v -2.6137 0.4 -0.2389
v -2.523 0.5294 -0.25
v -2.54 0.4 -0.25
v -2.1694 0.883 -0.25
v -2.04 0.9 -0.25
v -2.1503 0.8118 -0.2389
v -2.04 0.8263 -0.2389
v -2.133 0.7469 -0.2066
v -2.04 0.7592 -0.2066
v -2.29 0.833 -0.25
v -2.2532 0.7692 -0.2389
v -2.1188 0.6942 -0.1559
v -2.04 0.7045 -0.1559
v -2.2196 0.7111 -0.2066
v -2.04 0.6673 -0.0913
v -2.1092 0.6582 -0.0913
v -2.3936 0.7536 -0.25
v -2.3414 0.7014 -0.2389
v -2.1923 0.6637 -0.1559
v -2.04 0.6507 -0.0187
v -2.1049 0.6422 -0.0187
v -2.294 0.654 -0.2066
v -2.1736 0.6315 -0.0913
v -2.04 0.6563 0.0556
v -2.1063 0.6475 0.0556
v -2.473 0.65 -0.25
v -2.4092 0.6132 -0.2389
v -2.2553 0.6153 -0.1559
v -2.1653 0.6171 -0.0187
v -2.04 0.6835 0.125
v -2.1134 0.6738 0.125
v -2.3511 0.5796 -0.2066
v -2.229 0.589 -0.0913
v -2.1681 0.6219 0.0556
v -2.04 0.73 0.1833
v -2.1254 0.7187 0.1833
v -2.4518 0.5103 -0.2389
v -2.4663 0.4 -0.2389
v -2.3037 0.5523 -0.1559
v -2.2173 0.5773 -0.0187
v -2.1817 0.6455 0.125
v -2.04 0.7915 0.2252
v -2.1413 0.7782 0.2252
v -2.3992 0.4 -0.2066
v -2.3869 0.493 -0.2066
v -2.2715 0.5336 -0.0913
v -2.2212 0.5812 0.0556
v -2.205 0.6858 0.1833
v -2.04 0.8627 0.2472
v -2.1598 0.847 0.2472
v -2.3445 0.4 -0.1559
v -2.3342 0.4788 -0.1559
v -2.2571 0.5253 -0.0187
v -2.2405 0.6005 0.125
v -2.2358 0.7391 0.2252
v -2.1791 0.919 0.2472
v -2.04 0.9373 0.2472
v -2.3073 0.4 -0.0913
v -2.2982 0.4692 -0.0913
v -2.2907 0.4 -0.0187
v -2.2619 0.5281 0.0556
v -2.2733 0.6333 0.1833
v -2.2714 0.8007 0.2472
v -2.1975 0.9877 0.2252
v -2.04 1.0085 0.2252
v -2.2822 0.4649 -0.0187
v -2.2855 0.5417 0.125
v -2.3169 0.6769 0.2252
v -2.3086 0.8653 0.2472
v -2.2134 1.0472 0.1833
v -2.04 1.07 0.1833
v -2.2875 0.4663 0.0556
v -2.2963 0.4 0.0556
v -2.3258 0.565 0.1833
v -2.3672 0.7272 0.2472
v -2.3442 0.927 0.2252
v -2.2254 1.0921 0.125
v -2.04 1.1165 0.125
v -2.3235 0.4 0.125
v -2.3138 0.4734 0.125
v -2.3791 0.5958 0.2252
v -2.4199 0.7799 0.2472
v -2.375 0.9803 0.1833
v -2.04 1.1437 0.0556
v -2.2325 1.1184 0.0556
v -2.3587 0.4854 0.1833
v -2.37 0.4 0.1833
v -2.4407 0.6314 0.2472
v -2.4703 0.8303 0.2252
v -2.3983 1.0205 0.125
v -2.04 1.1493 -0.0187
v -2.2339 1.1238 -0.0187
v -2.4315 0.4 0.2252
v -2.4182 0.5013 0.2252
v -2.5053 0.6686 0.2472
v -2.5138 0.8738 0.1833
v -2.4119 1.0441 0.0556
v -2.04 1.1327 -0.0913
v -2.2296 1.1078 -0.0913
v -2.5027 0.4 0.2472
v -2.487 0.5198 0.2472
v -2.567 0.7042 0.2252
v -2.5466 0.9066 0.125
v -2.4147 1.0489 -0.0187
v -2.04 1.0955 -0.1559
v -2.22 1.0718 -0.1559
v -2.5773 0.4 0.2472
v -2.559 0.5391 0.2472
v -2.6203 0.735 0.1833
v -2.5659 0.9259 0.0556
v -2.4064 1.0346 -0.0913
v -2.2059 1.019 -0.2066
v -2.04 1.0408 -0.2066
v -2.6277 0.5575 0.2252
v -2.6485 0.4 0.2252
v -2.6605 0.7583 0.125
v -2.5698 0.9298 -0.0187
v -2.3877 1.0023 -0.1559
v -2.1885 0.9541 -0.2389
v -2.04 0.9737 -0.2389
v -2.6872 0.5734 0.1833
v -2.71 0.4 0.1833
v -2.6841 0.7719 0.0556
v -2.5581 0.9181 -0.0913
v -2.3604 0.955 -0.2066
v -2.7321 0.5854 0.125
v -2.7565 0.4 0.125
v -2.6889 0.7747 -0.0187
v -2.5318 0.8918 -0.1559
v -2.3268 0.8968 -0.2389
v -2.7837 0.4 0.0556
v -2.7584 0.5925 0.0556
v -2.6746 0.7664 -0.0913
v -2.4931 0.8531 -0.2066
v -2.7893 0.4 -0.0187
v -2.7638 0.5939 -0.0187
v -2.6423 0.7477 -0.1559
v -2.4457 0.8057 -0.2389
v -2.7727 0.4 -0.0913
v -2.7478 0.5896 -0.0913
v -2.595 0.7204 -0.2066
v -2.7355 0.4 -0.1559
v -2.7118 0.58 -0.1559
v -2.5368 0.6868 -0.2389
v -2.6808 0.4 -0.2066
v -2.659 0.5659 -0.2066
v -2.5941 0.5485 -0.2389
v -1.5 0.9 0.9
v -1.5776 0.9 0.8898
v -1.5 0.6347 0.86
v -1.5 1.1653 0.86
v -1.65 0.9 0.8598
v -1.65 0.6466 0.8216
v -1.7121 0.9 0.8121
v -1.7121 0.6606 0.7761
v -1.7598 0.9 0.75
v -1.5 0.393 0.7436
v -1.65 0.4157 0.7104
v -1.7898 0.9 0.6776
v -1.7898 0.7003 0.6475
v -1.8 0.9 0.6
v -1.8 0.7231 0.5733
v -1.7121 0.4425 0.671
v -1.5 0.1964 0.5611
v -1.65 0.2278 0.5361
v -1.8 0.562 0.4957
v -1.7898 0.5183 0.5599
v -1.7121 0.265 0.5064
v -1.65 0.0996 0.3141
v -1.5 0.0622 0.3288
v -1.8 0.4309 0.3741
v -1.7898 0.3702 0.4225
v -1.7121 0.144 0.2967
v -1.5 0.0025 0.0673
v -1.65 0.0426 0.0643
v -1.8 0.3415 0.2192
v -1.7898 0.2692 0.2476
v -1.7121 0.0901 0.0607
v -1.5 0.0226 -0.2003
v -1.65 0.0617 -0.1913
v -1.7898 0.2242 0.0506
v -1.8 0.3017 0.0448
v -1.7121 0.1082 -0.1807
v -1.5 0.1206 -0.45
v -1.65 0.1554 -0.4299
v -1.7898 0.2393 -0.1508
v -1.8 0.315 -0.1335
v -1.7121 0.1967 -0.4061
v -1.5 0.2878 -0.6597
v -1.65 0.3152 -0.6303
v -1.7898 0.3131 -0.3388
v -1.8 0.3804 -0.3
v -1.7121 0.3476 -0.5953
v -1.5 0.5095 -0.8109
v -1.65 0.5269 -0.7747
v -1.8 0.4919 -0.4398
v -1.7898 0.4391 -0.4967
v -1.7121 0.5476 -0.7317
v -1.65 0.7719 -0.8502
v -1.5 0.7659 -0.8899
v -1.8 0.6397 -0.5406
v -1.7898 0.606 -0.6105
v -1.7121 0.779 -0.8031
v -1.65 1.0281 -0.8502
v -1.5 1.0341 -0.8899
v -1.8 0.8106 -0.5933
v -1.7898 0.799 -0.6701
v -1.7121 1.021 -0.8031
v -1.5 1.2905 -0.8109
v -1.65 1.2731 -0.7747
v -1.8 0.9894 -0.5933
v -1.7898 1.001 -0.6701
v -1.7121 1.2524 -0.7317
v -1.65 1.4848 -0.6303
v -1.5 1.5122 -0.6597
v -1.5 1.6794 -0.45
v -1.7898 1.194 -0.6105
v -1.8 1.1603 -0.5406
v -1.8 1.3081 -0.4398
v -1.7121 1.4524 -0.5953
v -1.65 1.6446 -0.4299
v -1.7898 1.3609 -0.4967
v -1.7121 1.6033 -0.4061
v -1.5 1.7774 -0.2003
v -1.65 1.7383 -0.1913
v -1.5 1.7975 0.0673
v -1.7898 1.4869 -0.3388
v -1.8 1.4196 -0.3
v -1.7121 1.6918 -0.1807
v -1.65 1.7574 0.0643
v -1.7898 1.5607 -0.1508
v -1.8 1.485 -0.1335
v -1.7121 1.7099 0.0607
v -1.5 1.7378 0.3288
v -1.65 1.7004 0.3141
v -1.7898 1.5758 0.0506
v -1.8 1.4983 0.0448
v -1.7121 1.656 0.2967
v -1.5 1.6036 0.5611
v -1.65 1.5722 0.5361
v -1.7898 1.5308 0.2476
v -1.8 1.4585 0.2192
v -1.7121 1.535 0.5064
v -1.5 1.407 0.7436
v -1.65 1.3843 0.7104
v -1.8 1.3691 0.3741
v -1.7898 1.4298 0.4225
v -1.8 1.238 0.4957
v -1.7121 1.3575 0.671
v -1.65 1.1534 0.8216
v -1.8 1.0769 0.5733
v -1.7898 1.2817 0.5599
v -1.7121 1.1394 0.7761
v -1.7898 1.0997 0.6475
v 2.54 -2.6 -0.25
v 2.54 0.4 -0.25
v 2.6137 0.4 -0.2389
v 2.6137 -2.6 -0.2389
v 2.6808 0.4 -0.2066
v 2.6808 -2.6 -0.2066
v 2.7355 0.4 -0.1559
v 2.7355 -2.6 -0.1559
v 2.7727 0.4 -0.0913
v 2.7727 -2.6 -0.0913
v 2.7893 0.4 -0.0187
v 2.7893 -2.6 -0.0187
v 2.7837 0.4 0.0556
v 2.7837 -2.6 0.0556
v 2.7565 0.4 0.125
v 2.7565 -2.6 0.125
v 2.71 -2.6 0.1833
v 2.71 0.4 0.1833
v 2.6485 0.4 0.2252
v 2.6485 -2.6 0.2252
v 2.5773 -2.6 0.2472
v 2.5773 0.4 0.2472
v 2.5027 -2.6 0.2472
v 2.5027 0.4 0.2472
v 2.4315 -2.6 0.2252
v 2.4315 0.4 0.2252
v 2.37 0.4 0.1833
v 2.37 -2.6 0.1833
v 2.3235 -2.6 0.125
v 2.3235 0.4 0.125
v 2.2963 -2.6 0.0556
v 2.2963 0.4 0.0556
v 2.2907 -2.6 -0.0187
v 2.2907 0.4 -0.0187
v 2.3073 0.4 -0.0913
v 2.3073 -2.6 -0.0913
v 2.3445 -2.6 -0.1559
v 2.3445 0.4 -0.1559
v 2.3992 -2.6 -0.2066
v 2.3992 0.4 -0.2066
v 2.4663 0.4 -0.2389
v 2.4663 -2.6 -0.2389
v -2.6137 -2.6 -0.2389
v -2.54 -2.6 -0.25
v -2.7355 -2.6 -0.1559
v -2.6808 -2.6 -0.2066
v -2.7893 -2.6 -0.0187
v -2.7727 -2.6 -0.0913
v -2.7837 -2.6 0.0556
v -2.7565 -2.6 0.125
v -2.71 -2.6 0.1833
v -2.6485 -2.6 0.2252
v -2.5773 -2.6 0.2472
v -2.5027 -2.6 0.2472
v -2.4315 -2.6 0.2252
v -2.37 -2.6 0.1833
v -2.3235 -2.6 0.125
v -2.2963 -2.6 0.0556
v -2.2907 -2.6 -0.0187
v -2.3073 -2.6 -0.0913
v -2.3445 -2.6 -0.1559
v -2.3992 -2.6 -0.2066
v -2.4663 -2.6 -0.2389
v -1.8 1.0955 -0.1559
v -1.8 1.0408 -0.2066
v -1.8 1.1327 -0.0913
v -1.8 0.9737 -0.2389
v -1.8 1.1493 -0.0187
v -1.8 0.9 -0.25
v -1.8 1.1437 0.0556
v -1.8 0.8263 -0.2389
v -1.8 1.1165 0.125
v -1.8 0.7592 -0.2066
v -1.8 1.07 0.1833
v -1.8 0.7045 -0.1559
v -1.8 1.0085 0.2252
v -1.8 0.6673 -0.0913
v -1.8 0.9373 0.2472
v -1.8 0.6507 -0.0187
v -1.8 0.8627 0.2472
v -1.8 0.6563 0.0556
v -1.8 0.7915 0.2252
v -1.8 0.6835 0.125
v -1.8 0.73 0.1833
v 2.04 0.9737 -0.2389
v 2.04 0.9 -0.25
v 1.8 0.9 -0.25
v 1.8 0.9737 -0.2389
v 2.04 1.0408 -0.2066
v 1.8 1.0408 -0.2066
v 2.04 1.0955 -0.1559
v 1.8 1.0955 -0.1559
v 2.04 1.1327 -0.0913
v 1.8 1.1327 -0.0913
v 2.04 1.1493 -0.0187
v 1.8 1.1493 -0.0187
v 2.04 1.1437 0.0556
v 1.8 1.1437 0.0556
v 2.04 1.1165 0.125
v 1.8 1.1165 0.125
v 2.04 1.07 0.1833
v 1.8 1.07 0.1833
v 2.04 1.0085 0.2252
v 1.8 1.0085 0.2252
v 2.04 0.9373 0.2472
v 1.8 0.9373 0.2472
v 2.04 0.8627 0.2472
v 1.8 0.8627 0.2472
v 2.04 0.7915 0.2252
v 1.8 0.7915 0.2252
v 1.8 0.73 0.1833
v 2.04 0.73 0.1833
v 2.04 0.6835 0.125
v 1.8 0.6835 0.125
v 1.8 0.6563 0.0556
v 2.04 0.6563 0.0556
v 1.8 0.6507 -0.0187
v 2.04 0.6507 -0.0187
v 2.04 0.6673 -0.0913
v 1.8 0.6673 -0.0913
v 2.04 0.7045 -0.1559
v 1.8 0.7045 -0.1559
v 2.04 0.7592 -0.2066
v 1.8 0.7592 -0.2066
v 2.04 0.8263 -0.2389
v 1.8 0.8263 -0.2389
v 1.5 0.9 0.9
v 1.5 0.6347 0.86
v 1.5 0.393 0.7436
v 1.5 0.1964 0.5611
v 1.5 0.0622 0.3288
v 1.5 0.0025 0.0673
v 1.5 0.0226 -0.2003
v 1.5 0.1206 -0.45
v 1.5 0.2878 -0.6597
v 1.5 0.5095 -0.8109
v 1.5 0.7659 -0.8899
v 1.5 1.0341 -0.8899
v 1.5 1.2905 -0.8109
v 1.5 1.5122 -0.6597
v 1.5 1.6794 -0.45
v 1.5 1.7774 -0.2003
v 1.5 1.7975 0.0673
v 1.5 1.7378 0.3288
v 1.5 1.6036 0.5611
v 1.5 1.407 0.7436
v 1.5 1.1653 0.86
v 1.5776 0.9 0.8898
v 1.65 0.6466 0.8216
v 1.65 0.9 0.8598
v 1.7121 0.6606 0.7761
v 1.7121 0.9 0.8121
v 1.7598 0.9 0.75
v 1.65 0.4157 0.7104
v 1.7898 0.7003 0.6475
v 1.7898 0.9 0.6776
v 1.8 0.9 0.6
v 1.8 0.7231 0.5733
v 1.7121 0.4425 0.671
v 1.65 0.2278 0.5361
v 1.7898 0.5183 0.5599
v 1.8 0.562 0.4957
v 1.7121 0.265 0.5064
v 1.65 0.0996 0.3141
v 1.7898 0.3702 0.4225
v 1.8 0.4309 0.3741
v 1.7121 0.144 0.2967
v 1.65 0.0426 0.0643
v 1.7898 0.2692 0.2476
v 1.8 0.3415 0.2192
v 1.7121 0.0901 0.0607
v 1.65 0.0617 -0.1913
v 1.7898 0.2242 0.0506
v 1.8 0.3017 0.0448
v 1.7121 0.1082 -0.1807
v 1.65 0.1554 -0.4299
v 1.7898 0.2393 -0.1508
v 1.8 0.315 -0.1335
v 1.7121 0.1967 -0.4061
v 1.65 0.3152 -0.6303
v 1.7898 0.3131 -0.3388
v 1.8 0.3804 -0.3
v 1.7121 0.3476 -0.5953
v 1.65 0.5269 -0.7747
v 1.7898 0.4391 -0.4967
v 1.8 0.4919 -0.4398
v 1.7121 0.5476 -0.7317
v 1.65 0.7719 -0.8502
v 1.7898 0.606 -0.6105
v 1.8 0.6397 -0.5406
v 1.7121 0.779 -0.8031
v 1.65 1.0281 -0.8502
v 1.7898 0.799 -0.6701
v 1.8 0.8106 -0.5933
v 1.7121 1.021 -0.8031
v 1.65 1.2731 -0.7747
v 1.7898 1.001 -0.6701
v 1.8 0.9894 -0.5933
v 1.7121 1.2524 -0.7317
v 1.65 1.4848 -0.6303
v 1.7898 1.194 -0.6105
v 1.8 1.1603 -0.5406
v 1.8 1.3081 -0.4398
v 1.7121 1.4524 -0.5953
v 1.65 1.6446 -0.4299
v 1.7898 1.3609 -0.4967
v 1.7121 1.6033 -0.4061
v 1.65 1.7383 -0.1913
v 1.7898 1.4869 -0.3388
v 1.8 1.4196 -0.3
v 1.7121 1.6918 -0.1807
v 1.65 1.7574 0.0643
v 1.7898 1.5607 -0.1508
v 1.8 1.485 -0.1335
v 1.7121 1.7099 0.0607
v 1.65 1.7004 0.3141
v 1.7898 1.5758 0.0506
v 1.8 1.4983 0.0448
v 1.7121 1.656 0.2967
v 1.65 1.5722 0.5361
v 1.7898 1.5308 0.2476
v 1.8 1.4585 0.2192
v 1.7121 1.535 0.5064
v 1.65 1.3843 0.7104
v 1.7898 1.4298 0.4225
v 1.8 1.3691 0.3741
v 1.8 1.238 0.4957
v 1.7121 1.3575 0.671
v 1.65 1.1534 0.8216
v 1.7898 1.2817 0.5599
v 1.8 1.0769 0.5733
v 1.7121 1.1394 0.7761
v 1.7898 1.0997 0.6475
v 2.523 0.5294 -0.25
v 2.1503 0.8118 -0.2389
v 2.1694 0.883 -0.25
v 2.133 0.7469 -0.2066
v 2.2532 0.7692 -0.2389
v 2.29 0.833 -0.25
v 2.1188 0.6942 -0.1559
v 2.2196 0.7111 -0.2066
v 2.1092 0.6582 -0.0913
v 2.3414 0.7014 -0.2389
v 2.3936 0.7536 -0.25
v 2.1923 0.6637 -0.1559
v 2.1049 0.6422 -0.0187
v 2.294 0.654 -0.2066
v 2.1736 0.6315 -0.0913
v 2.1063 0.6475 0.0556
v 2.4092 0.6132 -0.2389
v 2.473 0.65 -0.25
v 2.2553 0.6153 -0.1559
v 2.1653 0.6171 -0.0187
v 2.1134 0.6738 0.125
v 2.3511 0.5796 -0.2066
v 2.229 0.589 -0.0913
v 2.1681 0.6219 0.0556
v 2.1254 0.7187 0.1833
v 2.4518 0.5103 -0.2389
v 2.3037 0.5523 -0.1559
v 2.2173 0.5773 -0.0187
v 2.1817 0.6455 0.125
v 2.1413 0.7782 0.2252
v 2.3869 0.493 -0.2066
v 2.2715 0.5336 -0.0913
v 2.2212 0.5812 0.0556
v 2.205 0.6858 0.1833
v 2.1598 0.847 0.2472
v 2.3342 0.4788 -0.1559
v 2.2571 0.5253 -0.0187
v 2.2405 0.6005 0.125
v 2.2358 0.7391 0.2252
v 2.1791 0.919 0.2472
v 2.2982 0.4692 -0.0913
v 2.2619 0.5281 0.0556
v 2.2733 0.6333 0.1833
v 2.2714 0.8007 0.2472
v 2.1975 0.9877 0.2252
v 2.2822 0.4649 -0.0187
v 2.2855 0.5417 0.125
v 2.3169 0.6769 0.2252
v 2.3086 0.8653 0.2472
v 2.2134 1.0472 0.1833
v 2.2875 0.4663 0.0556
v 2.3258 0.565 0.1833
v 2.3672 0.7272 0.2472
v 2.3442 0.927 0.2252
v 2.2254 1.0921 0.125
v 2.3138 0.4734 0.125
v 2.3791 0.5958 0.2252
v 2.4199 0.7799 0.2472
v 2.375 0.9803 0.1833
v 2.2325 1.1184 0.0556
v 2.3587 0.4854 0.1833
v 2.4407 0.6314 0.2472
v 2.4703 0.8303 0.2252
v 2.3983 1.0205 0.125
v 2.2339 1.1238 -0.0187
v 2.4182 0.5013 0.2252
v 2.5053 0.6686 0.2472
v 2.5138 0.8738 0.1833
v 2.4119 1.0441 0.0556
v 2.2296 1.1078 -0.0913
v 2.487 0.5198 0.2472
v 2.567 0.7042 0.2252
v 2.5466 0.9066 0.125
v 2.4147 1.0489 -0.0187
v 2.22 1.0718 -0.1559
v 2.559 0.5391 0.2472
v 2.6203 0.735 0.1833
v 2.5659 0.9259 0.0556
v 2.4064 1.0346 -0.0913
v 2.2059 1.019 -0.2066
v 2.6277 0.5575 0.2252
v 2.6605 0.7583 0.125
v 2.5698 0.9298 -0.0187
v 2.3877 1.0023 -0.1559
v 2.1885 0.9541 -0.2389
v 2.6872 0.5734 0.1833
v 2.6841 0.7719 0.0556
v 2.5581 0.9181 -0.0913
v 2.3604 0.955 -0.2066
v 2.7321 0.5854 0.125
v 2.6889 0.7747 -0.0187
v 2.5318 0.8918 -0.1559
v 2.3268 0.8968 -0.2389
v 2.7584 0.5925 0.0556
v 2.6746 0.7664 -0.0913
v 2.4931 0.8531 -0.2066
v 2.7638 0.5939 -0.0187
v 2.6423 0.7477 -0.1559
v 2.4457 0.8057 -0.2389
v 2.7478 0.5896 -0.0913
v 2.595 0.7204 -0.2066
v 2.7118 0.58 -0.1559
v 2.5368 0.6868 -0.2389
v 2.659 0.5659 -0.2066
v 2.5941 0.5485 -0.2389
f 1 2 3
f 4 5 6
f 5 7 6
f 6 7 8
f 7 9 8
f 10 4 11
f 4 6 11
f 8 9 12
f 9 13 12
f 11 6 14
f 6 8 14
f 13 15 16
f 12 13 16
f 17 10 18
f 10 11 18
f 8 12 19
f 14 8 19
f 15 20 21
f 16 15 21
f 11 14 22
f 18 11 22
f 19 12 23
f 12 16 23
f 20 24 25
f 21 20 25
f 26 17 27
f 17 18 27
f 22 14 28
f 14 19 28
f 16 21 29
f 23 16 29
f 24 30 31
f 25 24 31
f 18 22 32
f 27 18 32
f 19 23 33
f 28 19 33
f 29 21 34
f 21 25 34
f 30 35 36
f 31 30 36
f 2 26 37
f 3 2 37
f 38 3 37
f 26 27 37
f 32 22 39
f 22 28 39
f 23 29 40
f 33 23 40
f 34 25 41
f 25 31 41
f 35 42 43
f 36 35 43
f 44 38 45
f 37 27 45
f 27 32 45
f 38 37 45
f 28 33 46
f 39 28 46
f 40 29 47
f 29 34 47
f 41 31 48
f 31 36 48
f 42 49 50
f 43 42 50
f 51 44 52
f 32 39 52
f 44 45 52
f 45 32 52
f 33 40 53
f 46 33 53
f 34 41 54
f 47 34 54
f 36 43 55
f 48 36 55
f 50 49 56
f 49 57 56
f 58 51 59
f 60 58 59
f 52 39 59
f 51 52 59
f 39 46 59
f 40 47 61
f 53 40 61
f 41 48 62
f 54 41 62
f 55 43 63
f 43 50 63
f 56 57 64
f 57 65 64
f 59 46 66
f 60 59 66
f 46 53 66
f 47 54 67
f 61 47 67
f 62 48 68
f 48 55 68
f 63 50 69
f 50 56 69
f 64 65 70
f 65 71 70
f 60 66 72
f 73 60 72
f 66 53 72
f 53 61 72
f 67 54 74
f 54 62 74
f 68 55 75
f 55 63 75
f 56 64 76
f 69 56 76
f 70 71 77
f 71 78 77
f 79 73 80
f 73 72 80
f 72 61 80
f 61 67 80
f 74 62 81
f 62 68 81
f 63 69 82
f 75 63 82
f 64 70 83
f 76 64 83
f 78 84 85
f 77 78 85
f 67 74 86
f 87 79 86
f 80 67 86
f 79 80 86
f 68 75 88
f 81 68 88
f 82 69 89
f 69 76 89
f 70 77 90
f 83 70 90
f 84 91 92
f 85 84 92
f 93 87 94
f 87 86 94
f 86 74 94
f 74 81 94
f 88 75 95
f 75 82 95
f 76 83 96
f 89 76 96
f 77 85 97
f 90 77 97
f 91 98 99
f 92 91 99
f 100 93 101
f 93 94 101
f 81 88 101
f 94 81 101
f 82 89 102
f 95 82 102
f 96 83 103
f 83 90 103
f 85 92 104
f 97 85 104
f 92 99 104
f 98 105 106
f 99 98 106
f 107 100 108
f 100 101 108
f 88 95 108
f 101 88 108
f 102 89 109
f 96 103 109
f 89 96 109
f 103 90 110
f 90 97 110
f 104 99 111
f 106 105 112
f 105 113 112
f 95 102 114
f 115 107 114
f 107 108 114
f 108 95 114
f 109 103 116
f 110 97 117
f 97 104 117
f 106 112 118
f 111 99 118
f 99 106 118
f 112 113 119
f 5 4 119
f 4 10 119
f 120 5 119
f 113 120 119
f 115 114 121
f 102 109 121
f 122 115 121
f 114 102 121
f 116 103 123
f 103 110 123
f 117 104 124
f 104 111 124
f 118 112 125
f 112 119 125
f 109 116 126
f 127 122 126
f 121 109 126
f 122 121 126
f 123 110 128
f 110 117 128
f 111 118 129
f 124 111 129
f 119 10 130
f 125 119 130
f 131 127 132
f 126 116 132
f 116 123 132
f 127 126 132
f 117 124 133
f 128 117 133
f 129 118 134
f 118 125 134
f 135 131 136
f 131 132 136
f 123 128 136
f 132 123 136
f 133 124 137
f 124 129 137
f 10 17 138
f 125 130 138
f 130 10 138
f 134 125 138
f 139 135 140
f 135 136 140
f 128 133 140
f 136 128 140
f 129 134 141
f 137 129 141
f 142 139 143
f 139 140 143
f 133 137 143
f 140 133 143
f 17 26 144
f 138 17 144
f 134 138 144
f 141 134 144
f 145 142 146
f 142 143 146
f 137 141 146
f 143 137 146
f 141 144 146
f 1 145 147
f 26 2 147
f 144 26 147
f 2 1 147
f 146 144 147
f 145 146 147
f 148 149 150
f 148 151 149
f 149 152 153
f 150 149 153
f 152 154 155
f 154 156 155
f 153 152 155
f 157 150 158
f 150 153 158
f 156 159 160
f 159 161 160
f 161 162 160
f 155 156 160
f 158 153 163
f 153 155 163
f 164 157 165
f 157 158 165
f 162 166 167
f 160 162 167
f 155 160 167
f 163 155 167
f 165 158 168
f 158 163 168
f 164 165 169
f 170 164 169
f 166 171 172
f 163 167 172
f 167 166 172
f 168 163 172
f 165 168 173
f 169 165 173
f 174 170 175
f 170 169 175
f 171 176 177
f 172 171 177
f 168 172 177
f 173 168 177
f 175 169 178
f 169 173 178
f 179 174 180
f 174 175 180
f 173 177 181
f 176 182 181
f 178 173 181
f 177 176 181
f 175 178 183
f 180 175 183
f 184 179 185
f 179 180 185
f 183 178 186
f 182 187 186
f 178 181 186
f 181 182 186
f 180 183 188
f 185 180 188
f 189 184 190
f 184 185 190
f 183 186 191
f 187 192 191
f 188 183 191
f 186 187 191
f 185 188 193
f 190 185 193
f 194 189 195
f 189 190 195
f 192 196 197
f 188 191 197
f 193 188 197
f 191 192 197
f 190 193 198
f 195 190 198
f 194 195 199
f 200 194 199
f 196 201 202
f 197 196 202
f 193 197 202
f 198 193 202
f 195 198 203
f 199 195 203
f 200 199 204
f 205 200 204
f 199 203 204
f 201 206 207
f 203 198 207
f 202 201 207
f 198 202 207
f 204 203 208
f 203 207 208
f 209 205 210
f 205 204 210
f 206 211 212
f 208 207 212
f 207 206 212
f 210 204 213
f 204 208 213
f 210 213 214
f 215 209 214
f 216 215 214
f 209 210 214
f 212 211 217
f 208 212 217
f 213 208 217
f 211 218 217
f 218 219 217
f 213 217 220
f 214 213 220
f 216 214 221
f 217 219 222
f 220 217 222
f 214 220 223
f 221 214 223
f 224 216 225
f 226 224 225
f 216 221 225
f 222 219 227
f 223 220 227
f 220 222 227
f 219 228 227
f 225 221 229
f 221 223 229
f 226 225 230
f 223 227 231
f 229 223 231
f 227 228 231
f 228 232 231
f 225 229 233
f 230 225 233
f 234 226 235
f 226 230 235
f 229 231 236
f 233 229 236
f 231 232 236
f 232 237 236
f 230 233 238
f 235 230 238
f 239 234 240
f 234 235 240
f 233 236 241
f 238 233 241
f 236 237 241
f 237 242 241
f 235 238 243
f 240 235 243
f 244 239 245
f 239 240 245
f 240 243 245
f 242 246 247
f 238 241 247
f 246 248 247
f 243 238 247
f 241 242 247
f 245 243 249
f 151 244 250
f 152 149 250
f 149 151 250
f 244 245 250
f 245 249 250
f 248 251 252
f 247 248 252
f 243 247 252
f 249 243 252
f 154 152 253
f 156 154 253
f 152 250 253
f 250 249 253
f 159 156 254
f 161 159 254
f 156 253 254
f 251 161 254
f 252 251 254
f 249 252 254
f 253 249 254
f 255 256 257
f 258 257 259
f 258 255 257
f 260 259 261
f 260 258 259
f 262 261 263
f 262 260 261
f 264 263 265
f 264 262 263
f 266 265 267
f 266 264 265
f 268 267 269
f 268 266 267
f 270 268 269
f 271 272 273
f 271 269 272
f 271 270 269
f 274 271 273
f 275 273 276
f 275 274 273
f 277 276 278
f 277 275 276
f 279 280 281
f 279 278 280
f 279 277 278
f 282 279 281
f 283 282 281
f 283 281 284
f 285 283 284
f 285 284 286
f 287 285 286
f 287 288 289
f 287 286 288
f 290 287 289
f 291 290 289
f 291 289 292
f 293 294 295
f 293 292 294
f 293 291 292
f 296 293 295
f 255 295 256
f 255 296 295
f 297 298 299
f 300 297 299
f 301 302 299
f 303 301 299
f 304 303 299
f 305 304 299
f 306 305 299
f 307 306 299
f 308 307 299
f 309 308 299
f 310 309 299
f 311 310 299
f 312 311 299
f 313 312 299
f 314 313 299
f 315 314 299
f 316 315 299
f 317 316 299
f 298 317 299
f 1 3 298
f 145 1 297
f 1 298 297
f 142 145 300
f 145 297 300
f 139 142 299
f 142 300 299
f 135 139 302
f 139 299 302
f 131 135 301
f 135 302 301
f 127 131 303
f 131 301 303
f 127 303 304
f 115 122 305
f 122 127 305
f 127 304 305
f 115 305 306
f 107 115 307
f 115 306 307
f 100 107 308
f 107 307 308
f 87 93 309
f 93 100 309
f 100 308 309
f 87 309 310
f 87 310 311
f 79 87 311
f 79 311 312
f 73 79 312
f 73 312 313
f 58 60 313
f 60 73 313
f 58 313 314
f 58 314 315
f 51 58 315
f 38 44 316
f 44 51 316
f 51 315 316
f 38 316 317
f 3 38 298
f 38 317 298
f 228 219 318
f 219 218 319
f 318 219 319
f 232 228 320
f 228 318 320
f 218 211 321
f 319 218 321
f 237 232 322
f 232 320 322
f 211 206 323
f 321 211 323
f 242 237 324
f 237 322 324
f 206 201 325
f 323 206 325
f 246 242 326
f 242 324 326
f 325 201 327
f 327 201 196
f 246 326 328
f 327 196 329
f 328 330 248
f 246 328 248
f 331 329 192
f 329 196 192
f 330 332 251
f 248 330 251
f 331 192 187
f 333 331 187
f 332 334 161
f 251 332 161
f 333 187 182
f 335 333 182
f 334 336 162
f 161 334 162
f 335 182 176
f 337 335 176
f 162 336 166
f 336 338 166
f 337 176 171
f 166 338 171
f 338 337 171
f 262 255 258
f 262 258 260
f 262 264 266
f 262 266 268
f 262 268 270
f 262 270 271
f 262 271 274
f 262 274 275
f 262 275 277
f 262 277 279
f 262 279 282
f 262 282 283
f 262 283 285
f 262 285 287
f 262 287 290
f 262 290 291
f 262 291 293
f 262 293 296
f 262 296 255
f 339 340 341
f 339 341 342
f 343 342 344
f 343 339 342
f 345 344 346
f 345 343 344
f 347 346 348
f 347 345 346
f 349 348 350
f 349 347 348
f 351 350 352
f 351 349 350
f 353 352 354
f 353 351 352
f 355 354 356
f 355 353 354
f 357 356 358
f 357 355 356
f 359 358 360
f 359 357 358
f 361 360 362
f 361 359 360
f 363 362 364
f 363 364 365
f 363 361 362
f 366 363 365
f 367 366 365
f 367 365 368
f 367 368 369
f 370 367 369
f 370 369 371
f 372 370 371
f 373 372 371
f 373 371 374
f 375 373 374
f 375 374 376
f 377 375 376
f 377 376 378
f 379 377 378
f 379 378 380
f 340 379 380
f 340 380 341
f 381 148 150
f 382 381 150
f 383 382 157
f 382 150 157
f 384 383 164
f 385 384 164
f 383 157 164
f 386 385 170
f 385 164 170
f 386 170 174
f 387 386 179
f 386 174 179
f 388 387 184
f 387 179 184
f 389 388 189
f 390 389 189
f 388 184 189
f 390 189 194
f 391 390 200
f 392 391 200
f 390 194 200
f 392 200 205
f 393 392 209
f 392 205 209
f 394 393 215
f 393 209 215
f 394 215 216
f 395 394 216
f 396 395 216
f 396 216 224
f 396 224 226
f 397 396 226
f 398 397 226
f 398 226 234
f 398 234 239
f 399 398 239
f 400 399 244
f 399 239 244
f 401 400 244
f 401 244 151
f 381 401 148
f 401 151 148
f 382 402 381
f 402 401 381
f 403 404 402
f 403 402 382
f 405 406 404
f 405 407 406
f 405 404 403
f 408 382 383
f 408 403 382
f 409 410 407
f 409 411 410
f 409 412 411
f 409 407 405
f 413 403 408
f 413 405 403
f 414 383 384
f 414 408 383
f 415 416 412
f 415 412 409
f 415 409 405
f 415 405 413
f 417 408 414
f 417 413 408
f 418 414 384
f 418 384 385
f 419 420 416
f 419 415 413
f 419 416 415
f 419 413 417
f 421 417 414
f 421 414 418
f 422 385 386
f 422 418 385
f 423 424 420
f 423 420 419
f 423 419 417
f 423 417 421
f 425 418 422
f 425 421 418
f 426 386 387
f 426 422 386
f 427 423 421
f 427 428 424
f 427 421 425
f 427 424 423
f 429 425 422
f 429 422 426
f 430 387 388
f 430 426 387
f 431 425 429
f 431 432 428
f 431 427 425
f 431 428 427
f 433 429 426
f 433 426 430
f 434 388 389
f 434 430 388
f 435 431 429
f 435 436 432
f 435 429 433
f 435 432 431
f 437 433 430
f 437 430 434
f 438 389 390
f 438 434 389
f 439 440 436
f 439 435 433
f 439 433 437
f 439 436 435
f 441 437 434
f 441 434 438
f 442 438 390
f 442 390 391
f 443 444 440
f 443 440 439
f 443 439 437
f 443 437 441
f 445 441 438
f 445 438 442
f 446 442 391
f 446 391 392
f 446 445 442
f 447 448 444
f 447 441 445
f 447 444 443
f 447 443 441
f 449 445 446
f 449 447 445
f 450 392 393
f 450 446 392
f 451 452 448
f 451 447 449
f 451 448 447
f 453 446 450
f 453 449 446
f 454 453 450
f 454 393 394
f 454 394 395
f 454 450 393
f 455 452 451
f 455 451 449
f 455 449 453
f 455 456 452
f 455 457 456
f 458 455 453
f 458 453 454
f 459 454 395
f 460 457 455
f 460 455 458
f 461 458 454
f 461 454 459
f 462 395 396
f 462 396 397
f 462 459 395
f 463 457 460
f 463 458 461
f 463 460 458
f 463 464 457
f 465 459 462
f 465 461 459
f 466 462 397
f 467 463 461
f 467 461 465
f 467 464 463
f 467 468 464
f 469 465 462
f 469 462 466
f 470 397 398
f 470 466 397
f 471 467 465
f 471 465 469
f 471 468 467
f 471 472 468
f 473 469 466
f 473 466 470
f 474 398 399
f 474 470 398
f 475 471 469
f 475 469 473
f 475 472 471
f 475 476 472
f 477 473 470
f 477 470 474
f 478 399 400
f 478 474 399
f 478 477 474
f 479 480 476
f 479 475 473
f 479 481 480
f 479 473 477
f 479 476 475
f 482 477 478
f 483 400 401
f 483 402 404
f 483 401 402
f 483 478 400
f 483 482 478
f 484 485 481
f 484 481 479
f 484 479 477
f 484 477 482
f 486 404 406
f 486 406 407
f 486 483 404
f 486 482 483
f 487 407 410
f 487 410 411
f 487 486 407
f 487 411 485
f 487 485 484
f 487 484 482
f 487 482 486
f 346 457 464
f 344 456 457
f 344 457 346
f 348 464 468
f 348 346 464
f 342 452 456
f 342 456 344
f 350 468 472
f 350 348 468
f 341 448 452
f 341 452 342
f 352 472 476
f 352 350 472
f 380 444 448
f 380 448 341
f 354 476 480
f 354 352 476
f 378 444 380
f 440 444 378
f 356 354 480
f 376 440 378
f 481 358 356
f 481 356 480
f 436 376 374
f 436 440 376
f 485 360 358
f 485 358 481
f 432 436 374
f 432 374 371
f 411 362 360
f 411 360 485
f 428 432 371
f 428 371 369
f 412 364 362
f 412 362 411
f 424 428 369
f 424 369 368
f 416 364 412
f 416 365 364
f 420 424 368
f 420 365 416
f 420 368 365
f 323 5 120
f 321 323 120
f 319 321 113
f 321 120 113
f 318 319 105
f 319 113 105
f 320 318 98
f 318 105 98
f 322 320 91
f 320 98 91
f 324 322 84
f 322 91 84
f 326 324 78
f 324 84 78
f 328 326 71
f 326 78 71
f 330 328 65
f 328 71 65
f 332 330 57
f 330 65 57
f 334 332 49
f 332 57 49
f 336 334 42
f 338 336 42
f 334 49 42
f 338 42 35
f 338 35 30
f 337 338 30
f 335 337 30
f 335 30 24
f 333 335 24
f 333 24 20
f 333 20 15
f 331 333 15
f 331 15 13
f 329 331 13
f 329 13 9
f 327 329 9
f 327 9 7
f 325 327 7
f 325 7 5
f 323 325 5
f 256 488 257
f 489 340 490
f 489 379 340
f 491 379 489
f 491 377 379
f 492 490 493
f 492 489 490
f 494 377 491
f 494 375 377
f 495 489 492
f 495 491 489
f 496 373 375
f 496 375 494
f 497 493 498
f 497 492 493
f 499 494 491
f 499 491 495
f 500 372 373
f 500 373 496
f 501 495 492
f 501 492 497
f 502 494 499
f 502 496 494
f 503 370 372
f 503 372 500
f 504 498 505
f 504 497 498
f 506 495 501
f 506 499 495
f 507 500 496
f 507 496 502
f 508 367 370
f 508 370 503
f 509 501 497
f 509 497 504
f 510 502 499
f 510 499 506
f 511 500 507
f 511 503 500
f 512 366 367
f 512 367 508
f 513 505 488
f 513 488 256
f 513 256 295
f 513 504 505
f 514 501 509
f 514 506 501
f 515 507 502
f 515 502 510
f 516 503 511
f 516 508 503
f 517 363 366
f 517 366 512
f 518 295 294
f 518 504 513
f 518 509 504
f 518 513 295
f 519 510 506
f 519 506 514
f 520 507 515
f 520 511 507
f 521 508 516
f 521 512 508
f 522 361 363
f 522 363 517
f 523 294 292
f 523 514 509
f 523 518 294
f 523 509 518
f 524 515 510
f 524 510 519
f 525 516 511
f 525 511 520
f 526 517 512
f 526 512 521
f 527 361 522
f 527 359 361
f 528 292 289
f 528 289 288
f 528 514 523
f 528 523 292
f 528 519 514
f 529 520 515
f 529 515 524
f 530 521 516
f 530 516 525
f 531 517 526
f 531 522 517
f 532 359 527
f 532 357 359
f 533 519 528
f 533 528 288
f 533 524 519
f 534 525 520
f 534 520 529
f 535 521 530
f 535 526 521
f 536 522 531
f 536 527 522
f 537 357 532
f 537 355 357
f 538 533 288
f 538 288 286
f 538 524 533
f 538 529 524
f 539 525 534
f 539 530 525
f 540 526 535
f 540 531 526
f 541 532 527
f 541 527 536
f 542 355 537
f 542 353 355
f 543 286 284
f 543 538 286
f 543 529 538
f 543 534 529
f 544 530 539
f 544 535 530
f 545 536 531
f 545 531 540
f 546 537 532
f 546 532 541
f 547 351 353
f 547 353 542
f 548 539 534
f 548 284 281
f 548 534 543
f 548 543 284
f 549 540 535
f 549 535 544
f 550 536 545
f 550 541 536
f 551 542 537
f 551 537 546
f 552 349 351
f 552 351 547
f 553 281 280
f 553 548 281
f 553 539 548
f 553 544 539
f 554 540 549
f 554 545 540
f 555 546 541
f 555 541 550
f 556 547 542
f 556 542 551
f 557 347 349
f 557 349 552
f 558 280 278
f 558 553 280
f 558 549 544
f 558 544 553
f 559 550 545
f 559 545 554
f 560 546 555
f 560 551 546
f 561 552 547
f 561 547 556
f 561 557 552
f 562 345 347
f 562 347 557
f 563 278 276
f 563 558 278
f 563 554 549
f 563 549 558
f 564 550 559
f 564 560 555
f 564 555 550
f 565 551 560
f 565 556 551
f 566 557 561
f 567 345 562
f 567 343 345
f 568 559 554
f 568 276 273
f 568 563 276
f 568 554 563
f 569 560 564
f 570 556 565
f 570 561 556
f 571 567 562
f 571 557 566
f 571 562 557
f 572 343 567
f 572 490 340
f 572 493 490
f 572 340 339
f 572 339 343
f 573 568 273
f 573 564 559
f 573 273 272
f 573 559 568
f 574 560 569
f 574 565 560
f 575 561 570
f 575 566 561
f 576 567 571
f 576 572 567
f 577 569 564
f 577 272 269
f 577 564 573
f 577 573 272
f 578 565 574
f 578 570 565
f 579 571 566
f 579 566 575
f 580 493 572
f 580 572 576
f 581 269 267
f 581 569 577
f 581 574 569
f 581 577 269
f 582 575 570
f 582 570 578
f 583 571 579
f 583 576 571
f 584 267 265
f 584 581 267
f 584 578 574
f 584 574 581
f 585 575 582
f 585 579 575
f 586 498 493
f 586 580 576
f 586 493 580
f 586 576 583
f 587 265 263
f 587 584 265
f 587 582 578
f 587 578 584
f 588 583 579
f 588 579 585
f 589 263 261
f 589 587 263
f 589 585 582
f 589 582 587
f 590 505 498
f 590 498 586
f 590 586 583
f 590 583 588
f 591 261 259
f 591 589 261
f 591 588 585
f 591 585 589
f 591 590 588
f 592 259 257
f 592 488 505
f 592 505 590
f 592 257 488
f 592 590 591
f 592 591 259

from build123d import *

# Parameters (mm, degrees)
SKETCH1_W            = 1.8
SKETCH1_H            = 0.9
SKETCH3_R            = 0.25
FILLET1_R            = 0.3
FILLET1_OF_MIRROR1_R = 0.3


with BuildPart() as part:
    # Sketch1 → Revolve1 (revolve)
    with BuildSketch(Plane.XY, mode=Mode.PRIVATE) as revolve1_sk:
        with Locations((0.9, 0.45)):
            Rectangle(SKETCH1_W, SKETCH1_H)
    revolve1 = revolve(revolve1_sk.sketch.rotate(Axis((0, 0.9, 0), (1, 0, 0)), 270), axis=Axis((0, 0.9, 0), (1, 0, 0)))

    # Sweep1: sweep along a path in Sketch2
    with BuildLine(Plane.XY) as sweep1_path:
        Line((1.8, 0.9), (2.04, 0.9))
        ThreePointArc((2.04, 0.9), (2.393553391, 0.753553391), (2.54, 0.4))
        Line((2.54, 0.4), (2.54, -2.6))
    # Sketch3 → Sweep1 (sweep)
    with BuildSketch(Plane(origin=(1.8, 0, 0), x_dir=(0, 0, -1), z_dir=(1, 0, 0))):
        with Locations((0, 0.9)):
            Circle(SKETCH3_R)
    sweep1 = sweep(path=sweep1_path.line)

    # Fillet1
    fillet1_edges = [part.edges().sort_by_distance(p)[0] for p in [
        (1.8, 0.9, -0.9),
    ]]
    fillet(fillet1_edges, radius=FILLET1_R)

    # Mirror1: Revolve1, Sweep1 across plane
    add(revolve1.mirror(Plane.ZY))
    add(sweep1.mirror(Plane.ZY))

    # Fillet1 of Mirror1
    fillet1_of_mirror1_edges = [part.edges().sort_by_distance(p)[0] for p in [
        (-1.8, 0.9, -0.9),
    ]]
    fillet(fillet1_of_mirror1_edges, radius=FILLET1_OF_MIRROR1_R)


solid = part.part
